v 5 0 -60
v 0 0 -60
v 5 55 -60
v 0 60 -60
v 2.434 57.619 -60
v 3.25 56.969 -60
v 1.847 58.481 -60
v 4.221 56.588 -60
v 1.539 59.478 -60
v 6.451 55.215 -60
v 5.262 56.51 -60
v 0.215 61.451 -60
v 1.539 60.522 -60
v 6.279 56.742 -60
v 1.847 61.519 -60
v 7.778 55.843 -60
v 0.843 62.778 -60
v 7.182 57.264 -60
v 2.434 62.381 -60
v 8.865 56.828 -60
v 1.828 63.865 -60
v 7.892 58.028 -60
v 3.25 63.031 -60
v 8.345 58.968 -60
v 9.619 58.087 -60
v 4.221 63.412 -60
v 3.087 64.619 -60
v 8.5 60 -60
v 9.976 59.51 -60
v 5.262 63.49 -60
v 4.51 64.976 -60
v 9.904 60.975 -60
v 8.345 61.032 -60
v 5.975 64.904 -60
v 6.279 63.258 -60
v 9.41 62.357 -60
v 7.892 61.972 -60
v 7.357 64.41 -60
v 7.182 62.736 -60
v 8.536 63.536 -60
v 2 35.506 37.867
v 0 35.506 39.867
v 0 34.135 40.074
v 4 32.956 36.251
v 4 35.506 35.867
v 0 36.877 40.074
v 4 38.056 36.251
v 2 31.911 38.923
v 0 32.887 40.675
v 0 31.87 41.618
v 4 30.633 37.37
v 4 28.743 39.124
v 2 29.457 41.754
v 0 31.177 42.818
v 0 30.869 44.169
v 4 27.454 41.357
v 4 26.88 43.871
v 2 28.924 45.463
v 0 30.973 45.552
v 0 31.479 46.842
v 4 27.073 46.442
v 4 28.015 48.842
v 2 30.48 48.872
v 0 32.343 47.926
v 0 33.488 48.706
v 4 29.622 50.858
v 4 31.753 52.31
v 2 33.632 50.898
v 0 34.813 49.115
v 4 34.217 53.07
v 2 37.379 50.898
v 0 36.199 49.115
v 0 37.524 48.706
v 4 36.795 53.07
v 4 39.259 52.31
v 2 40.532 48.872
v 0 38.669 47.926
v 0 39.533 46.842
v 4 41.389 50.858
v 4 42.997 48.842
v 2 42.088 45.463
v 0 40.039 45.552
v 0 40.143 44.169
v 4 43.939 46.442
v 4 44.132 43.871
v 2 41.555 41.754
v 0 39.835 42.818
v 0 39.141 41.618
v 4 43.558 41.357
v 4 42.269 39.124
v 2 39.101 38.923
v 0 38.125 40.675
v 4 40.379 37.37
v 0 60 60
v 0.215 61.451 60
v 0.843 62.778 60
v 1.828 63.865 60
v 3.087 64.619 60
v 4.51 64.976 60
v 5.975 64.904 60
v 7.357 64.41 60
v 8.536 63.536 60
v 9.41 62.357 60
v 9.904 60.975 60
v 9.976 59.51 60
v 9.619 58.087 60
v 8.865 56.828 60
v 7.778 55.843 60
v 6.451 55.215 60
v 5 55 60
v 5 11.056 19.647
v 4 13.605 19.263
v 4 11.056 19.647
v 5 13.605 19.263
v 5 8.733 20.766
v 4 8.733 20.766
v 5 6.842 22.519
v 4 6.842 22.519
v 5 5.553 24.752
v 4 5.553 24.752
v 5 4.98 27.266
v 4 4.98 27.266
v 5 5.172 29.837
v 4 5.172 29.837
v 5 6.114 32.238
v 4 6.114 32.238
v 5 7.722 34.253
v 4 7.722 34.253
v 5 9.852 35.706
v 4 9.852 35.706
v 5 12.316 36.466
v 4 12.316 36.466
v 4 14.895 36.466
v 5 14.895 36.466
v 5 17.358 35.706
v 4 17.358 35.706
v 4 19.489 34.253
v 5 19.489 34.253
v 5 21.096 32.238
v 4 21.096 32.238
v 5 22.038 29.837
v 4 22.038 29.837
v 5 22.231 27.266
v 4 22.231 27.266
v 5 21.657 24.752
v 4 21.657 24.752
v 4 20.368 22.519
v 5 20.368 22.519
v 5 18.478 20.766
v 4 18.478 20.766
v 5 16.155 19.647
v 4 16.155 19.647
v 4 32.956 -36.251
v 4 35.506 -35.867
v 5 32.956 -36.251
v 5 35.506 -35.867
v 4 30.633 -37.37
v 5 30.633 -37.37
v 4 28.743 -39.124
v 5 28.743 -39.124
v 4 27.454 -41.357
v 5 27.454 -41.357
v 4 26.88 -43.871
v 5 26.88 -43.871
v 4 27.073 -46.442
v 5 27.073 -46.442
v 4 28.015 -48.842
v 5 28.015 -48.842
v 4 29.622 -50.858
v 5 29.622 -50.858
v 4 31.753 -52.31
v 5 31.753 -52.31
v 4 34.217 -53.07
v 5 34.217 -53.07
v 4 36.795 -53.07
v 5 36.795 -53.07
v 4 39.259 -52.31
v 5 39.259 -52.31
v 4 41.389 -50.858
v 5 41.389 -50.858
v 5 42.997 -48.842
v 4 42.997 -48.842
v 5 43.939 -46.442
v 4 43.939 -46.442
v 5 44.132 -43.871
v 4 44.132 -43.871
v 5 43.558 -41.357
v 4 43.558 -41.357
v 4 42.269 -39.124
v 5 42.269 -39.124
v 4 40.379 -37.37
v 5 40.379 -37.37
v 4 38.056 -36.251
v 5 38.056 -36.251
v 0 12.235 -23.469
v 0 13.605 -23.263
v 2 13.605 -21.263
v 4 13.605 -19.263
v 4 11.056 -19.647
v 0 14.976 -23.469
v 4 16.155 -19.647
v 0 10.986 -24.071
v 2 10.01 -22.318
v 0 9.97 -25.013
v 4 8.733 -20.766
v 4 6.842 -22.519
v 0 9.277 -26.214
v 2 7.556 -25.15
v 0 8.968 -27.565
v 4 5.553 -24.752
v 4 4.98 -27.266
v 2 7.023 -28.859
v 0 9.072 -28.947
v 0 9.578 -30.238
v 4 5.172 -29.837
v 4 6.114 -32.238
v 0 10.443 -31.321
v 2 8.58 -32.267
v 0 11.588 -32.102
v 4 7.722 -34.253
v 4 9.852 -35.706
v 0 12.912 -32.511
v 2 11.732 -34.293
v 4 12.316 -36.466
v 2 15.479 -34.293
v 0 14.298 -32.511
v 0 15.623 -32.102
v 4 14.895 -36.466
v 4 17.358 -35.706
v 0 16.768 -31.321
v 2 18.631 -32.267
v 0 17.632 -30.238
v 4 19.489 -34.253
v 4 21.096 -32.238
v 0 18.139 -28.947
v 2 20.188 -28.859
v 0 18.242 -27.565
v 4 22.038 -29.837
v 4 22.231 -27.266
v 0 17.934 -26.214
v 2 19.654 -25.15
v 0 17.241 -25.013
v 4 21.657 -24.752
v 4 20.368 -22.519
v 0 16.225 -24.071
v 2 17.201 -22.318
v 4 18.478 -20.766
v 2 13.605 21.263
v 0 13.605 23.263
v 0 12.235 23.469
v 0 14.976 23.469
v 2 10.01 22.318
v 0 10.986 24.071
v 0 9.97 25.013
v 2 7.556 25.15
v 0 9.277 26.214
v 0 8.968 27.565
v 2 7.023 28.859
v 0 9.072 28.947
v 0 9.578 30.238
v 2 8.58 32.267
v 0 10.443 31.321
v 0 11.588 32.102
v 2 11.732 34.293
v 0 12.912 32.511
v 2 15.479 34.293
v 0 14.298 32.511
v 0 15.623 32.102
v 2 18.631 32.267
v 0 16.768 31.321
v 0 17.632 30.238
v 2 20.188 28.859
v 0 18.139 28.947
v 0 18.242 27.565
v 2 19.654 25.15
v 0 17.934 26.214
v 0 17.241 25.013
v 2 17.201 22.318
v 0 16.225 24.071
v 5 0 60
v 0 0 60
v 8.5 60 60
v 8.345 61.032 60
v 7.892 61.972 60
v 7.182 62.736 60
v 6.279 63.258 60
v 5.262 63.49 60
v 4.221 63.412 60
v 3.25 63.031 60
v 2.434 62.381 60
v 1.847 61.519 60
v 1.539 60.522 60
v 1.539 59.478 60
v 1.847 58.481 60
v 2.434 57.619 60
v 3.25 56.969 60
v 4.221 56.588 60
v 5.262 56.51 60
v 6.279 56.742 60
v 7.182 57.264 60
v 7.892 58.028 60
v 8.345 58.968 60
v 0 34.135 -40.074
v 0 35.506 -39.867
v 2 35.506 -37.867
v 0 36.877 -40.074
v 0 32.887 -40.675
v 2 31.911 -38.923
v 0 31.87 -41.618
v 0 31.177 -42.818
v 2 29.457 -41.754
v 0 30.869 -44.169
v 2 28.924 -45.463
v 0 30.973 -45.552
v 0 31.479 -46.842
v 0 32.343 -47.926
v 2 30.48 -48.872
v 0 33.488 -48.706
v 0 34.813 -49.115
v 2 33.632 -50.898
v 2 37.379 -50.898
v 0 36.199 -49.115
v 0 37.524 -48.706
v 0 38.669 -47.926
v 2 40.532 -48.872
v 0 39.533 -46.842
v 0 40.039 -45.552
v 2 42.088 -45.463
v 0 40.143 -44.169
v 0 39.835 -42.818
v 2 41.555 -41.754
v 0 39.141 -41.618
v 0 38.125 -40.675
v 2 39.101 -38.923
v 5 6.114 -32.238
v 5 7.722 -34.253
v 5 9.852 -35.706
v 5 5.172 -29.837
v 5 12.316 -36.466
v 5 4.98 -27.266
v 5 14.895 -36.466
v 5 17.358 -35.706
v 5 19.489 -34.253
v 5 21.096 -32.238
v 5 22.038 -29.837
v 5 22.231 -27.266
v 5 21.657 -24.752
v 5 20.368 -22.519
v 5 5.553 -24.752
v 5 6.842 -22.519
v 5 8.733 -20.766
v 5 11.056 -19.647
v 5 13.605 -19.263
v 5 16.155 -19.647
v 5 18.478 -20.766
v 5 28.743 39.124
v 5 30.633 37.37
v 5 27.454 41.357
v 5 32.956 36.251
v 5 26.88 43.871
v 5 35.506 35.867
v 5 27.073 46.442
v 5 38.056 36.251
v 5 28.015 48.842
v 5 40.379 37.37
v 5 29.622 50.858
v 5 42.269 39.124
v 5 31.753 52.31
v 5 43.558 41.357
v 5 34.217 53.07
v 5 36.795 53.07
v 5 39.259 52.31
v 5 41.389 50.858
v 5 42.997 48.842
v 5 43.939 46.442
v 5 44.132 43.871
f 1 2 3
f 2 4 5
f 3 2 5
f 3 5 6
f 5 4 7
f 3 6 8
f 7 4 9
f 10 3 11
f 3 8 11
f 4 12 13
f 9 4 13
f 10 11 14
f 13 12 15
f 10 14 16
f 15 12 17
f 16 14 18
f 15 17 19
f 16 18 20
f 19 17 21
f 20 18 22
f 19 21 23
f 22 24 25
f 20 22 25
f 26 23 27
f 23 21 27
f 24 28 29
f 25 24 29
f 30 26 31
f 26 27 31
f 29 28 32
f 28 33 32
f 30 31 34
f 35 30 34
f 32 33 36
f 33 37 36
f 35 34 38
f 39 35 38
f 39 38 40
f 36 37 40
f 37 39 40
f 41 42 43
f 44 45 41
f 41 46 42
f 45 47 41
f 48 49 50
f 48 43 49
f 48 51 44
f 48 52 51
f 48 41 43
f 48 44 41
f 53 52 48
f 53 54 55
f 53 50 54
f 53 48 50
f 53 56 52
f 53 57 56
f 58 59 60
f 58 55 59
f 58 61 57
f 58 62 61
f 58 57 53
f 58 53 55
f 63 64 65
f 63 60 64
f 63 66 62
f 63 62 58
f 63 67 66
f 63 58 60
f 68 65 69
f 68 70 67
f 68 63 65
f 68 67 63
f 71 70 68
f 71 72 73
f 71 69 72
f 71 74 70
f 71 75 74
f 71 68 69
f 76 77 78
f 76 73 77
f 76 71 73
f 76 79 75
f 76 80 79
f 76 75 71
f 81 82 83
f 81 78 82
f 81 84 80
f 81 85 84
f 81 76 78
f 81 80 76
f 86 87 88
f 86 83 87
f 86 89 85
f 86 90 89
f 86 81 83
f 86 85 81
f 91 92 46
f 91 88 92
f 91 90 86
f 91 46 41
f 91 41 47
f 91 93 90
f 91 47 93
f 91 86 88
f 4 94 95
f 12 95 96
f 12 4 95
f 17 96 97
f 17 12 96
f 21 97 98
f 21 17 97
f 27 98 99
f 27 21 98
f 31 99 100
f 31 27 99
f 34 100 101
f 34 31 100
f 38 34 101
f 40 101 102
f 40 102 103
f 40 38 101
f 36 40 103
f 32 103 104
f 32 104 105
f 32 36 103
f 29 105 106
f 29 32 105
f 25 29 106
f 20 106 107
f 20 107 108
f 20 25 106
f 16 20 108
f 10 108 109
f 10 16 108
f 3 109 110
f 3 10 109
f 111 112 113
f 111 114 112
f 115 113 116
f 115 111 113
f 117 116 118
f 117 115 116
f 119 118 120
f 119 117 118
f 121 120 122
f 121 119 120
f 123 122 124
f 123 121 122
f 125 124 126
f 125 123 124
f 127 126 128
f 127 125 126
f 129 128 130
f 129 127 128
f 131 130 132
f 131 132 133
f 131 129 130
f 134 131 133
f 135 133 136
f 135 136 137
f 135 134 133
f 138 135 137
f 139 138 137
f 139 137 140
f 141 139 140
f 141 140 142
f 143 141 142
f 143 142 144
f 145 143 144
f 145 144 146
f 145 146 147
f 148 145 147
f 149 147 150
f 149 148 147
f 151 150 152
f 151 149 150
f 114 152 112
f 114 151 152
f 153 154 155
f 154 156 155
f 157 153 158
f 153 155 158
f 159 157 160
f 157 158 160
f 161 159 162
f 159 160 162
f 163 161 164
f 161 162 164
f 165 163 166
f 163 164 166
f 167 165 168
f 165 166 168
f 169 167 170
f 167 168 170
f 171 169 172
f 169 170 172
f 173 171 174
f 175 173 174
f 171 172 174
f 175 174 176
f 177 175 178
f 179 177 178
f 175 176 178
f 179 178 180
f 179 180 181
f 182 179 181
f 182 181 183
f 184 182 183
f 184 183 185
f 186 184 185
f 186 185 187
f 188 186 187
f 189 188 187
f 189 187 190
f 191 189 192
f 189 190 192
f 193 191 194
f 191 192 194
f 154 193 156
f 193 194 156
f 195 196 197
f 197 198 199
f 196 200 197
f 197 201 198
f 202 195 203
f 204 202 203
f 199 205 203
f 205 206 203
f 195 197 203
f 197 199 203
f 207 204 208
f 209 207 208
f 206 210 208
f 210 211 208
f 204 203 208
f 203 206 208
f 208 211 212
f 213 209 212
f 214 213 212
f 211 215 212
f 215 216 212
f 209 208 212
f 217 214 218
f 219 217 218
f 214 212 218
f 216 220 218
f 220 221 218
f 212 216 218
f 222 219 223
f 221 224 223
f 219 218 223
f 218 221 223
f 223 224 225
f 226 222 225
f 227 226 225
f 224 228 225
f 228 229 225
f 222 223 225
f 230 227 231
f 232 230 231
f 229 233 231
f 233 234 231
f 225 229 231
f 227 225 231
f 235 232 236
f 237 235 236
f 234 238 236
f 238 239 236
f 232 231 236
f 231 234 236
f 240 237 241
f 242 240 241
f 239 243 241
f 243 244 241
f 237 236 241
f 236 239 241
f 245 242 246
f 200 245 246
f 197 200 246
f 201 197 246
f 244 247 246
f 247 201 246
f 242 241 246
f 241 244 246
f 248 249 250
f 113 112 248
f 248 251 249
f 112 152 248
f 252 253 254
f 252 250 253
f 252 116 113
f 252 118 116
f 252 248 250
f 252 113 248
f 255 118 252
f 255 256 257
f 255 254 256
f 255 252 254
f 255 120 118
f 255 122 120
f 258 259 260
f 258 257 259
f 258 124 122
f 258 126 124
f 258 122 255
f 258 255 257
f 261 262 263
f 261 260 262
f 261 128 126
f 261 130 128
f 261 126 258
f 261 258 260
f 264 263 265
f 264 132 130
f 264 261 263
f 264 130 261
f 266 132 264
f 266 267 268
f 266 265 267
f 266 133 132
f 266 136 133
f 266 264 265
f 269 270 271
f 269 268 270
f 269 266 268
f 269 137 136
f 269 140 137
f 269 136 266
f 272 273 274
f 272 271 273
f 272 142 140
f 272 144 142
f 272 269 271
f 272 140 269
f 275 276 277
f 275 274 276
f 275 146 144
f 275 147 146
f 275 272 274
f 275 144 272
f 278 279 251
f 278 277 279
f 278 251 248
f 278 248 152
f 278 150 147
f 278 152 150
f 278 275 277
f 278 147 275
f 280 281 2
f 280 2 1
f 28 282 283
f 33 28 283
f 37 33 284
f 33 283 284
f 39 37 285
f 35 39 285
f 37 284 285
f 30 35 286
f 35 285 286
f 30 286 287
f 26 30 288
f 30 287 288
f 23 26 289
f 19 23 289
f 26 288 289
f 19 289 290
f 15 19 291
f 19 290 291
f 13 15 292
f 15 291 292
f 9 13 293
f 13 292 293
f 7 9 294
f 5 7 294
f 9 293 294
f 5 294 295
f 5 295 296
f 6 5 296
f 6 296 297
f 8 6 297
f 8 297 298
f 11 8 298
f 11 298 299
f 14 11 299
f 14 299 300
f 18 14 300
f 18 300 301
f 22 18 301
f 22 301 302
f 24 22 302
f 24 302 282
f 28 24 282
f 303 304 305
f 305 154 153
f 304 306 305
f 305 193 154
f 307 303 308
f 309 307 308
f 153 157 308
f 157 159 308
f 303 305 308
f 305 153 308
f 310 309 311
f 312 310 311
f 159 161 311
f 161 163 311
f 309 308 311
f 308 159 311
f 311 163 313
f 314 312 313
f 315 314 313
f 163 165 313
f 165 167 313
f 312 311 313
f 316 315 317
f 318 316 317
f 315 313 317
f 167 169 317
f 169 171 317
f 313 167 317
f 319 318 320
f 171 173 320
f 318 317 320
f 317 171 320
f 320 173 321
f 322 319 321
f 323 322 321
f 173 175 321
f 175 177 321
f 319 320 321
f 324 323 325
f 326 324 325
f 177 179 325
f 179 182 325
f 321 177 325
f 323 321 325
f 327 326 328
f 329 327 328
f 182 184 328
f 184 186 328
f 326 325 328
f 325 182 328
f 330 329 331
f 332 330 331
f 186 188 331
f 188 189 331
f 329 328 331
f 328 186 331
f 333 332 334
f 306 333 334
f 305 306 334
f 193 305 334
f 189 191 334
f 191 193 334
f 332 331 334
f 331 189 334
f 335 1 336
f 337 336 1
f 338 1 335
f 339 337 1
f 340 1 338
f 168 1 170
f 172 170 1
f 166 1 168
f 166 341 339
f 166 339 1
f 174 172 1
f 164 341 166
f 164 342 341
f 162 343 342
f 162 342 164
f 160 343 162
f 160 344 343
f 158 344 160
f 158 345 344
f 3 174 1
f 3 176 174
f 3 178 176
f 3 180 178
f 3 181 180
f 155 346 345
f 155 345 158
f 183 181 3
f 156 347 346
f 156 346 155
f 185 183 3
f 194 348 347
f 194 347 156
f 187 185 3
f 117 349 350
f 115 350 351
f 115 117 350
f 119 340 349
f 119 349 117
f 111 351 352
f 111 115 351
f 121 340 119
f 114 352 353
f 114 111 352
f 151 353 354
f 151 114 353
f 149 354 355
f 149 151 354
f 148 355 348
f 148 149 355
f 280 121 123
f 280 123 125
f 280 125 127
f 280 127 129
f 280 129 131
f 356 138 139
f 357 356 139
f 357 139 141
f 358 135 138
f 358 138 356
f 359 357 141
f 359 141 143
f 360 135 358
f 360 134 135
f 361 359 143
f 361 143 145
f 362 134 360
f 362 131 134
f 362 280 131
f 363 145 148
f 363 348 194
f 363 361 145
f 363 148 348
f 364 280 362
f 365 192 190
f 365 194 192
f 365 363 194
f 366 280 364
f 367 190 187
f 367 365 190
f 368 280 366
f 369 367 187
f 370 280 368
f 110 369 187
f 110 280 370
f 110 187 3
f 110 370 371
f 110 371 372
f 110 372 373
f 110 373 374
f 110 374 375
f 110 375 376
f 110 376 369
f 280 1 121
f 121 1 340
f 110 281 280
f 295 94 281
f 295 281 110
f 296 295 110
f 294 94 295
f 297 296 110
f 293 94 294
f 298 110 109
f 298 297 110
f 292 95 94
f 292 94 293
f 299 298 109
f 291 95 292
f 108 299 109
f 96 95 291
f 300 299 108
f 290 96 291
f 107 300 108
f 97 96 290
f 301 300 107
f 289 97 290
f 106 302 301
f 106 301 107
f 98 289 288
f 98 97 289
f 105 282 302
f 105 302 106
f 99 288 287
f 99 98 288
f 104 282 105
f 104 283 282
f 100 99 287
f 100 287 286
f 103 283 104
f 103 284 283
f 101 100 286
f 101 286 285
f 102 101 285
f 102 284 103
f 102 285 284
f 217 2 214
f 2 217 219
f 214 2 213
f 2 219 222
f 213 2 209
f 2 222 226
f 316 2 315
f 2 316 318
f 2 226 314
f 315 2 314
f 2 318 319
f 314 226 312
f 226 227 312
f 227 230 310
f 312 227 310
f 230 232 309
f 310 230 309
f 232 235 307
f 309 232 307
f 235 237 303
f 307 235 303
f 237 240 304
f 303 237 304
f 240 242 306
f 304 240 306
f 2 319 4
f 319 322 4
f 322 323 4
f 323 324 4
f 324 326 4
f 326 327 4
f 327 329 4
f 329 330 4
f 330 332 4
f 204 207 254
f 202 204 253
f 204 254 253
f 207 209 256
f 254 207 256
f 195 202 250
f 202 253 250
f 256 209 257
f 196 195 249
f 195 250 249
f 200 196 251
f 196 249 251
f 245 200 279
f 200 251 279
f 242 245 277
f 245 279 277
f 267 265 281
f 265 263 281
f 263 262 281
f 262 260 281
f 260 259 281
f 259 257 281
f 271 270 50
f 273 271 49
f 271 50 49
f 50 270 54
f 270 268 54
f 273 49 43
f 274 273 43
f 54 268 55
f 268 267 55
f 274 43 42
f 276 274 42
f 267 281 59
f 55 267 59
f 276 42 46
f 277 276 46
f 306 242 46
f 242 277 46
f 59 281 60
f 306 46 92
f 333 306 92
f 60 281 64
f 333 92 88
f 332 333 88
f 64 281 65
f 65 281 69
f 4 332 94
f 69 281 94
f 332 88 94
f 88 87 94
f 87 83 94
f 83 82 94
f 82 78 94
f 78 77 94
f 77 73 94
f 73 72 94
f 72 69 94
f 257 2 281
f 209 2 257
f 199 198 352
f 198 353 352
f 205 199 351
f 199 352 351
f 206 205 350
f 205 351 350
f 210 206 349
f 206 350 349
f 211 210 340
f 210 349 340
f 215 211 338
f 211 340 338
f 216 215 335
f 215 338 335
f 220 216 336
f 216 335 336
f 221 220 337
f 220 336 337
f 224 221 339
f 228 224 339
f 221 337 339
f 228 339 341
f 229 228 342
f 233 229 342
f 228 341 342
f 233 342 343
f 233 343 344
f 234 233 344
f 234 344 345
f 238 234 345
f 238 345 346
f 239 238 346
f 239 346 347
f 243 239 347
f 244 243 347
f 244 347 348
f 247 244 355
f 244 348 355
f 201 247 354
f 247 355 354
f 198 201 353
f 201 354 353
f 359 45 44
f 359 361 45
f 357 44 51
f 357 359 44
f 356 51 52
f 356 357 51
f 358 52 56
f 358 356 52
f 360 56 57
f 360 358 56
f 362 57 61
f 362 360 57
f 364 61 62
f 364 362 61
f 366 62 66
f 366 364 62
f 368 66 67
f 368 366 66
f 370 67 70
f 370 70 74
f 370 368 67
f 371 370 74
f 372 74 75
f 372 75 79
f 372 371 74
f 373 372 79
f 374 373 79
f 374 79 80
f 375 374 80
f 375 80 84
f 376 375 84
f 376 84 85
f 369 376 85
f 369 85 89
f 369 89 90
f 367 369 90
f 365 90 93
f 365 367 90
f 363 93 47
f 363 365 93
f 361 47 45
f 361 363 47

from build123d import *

# Parameters (mm, degrees)
SKETCH2_W                                      = 5
SKETCH2_H                                      = 60
EXTRUDE_THIN1_DEPTH                            = 60
SKETCH3_R                                      = 5
SKETCH4_R                                      = 3.5
CUT_EXTRUDE1_DEPTH                             = 137.839321834
CSK_FOR_M8_FLAT_HEAD_MACHINE_SCREW1_AT_2_COUNT = 2
CSK_FOR_M8_FLAT_HEAD_MACHINE_SCREW1_AT_2_PITCH = 27.483528756


with BuildPart() as part:
    # Sketch2 → Extrude-Thin1 (new, symmetric)
    with BuildSketch(Plane.XY):
        with Locations((2.5, 30)):
            Rectangle(SKETCH2_W, SKETCH2_H)
    extrude(amount=EXTRUDE_THIN1_DEPTH, both=True)

    # Sweep11: sweep along a curve in space
    with BuildLine() as sweep11_path:
        Line((5, 60, 60), (5, 60, -60))
    # Sketch3 → Sweep11 (sweep)
    with BuildSketch(Plane.XY.offset(60)):
        with Locations((5, 60)):
            Circle(SKETCH3_R)
    sweep(path=sweep11_path.line)

    # Sketch4 → Cut-Extrude1 (cut, through all)
    with BuildSketch(Plane.XY.offset(60)):
        with Locations((5, 60)):
            Circle(SKETCH4_R)
    extrude(amount=-CUT_EXTRUDE1_DEPTH, mode=Mode.SUBTRACT)

    # Sketch6 → CSK for M8 Flat Head Machine Screw1 (revolve, cut)
    with BuildSketch(Plane(origin=(5, 35.505970187, 44.516987054), x_dir=(0, 0, -1), z_dir=(0, 1, 0))):
        Polygon((0, 0), (0, 5), (4.5, 5), (4.5, 5.15), (8.65, 1), (8.65, 0), align=None)
    csk_for_m8_flat_head_machine_screw1 = revolve(axis=Axis((11.35, 35.505970187, 44.516987054), (-1, 0, 0)), mode=Mode.SUBTRACT)

    # CSK for M8 Flat Head Machine Screw1 at 2: CSK for M8 Flat Head Machine Screw1 ×2
    with Locations(*[Vector(0, -0.7968641919109715, -0.604158472298514) * (i * CSK_FOR_M8_FLAT_HEAD_MACHINE_SCREW1_AT_2_PITCH) for i in range(1, CSK_FOR_M8_FLAT_HEAD_MACHINE_SCREW1_AT_2_COUNT)]):
        add(csk_for_m8_flat_head_machine_screw1, mode=Mode.SUBTRACT)

    # Mirror1: CSK for M8 Flat Head Machine Screw1 across plane
    add(csk_for_m8_flat_head_machine_screw1.mirror(Plane.XY), mode=Mode.SUBTRACT)

    # Mirror1 copy 1 sketch → Mirror1 copy 1 (revolve, cut)
    with BuildSketch(Plane(origin=(5, 13.605330254, -27.912580307), x_dir=(0, 0, 1), z_dir=(0, 1, 0))):
        Polygon((0, 0), (0, -5), (4.5, -5), (4.5, -5.15), (8.65, -1), (8.65, 0), align=None)
    revolve(axis=Axis((11.35, 13.605330254, -27.912580307), (1, 0, 0)), mode=Mode.SUBTRACT)


solid = part.part
